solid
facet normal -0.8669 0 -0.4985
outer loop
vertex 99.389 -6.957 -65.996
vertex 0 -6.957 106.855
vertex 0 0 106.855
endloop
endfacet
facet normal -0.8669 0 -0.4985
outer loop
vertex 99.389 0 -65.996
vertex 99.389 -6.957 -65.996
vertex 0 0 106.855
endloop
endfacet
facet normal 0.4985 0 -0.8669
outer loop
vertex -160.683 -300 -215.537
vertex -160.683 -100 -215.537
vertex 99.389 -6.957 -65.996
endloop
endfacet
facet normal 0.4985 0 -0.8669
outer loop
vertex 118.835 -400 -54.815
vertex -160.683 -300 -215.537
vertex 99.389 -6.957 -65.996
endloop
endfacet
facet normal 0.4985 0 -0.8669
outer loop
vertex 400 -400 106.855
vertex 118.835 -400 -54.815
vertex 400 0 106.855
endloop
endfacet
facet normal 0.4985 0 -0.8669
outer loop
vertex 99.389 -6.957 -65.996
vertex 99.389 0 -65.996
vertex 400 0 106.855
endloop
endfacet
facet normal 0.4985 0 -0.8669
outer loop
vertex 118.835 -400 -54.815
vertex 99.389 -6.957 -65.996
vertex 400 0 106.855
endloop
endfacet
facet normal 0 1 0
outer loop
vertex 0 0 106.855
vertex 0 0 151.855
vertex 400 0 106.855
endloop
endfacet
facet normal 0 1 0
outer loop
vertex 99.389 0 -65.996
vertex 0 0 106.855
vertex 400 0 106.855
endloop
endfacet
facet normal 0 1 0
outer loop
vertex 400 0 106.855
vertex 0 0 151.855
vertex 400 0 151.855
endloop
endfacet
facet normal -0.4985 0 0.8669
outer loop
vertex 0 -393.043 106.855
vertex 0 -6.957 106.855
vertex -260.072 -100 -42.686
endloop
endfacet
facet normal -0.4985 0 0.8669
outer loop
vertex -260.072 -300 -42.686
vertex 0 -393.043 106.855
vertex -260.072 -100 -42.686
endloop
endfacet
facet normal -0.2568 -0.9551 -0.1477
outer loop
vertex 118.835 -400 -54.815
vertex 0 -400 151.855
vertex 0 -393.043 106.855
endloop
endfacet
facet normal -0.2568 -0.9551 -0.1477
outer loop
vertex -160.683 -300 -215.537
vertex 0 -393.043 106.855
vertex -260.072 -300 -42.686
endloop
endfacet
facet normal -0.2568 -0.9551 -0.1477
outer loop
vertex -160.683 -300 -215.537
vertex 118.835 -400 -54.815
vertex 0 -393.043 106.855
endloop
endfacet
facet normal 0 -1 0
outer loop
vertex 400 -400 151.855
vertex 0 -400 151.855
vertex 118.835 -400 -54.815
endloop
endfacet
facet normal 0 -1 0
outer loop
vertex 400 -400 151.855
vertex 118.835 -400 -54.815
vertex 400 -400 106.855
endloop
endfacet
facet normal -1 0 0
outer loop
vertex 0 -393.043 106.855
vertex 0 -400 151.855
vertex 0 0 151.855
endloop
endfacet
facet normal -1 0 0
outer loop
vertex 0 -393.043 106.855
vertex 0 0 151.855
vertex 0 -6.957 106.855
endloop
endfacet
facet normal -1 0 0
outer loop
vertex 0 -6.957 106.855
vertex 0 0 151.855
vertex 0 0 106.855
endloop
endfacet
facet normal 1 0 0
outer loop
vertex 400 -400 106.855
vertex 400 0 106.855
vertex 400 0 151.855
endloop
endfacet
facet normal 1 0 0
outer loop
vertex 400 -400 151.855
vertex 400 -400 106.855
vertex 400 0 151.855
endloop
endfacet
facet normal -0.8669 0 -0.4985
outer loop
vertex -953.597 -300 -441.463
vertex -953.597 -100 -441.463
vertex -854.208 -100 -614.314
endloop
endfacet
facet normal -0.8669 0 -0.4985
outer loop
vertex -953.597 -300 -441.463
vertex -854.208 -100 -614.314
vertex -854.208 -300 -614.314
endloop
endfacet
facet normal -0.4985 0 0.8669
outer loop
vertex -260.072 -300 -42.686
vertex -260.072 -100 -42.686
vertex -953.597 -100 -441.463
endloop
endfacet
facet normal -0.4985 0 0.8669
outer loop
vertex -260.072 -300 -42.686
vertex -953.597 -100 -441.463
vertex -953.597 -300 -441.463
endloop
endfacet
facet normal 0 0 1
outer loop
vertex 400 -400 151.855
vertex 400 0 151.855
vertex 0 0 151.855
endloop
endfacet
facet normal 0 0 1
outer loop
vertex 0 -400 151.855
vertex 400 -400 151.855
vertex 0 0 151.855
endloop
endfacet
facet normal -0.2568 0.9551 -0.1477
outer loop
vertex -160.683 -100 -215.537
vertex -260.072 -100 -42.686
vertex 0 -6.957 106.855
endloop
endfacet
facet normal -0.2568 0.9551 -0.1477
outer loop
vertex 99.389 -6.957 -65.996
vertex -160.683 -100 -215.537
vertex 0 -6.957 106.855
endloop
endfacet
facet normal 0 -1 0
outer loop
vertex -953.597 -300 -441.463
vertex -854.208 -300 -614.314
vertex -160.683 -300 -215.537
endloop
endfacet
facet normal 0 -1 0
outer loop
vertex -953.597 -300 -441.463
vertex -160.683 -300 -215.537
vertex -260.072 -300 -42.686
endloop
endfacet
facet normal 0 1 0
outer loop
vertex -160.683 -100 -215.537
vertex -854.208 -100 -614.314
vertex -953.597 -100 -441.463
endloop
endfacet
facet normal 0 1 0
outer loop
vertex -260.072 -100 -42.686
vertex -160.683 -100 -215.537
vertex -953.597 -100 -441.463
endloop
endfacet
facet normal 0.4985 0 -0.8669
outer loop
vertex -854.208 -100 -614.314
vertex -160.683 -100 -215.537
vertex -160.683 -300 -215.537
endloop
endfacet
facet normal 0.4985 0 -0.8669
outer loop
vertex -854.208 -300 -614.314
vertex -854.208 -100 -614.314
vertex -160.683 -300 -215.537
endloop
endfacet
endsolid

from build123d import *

# Parameters (mm, degrees)
F1_DEPTH = 400
F3_DEPTH = 500
F4_W     = 200
F4_H     = 199.3884497032
F5_DEPTH = 800


with BuildPart() as f1:
    # F0 (on Front) → F1 (new body)
    with BuildSketch(Plane.XZ):
        Polygon((400, 151.8551181662), (0, 151.8551181662), (0, 106.8551181662), (-260.0718909173, -42.6862191112), (-160.6825062296, -215.5373229158), (400, 106.8551181662), align=None)
    extrude(amount=F1_DEPTH)

    # F2 (on face) → F3 (cut, symmetric)
    with BuildSketch(Plane(origin=(-46.1750628055, 0, 80.3044570531), x_dir=(0.8669063031, 0, 0.4984711243), z_dir=(-0.4984711243, 0, 0.8669063031))):
        Polygon((75.6953914767, -400), (-246.735809115, -300), (-246.735809115, -400), align=None)
        Polygon((-246.735809115, 0), (-246.735809115, -100), (53.264190885, -6.956895161), (53.264190885, 0), align=None)
    extrude(amount=F3_DEPTH, both=True, mode=Mode.SUBTRACT)

    # F4 (on face) → F5 (join)
    with BuildSketch(Plane(origin=(-213.8968281118, 0, -122.9906761643), x_dir=(0, -1, 0), z_dir=(-0.8669063031, 0, -0.4984711243))):
        with Locations((200, -7.0608493994)):
            Rectangle(F4_W, F4_H)
    extrude(amount=F5_DEPTH)


solid = f1.part
